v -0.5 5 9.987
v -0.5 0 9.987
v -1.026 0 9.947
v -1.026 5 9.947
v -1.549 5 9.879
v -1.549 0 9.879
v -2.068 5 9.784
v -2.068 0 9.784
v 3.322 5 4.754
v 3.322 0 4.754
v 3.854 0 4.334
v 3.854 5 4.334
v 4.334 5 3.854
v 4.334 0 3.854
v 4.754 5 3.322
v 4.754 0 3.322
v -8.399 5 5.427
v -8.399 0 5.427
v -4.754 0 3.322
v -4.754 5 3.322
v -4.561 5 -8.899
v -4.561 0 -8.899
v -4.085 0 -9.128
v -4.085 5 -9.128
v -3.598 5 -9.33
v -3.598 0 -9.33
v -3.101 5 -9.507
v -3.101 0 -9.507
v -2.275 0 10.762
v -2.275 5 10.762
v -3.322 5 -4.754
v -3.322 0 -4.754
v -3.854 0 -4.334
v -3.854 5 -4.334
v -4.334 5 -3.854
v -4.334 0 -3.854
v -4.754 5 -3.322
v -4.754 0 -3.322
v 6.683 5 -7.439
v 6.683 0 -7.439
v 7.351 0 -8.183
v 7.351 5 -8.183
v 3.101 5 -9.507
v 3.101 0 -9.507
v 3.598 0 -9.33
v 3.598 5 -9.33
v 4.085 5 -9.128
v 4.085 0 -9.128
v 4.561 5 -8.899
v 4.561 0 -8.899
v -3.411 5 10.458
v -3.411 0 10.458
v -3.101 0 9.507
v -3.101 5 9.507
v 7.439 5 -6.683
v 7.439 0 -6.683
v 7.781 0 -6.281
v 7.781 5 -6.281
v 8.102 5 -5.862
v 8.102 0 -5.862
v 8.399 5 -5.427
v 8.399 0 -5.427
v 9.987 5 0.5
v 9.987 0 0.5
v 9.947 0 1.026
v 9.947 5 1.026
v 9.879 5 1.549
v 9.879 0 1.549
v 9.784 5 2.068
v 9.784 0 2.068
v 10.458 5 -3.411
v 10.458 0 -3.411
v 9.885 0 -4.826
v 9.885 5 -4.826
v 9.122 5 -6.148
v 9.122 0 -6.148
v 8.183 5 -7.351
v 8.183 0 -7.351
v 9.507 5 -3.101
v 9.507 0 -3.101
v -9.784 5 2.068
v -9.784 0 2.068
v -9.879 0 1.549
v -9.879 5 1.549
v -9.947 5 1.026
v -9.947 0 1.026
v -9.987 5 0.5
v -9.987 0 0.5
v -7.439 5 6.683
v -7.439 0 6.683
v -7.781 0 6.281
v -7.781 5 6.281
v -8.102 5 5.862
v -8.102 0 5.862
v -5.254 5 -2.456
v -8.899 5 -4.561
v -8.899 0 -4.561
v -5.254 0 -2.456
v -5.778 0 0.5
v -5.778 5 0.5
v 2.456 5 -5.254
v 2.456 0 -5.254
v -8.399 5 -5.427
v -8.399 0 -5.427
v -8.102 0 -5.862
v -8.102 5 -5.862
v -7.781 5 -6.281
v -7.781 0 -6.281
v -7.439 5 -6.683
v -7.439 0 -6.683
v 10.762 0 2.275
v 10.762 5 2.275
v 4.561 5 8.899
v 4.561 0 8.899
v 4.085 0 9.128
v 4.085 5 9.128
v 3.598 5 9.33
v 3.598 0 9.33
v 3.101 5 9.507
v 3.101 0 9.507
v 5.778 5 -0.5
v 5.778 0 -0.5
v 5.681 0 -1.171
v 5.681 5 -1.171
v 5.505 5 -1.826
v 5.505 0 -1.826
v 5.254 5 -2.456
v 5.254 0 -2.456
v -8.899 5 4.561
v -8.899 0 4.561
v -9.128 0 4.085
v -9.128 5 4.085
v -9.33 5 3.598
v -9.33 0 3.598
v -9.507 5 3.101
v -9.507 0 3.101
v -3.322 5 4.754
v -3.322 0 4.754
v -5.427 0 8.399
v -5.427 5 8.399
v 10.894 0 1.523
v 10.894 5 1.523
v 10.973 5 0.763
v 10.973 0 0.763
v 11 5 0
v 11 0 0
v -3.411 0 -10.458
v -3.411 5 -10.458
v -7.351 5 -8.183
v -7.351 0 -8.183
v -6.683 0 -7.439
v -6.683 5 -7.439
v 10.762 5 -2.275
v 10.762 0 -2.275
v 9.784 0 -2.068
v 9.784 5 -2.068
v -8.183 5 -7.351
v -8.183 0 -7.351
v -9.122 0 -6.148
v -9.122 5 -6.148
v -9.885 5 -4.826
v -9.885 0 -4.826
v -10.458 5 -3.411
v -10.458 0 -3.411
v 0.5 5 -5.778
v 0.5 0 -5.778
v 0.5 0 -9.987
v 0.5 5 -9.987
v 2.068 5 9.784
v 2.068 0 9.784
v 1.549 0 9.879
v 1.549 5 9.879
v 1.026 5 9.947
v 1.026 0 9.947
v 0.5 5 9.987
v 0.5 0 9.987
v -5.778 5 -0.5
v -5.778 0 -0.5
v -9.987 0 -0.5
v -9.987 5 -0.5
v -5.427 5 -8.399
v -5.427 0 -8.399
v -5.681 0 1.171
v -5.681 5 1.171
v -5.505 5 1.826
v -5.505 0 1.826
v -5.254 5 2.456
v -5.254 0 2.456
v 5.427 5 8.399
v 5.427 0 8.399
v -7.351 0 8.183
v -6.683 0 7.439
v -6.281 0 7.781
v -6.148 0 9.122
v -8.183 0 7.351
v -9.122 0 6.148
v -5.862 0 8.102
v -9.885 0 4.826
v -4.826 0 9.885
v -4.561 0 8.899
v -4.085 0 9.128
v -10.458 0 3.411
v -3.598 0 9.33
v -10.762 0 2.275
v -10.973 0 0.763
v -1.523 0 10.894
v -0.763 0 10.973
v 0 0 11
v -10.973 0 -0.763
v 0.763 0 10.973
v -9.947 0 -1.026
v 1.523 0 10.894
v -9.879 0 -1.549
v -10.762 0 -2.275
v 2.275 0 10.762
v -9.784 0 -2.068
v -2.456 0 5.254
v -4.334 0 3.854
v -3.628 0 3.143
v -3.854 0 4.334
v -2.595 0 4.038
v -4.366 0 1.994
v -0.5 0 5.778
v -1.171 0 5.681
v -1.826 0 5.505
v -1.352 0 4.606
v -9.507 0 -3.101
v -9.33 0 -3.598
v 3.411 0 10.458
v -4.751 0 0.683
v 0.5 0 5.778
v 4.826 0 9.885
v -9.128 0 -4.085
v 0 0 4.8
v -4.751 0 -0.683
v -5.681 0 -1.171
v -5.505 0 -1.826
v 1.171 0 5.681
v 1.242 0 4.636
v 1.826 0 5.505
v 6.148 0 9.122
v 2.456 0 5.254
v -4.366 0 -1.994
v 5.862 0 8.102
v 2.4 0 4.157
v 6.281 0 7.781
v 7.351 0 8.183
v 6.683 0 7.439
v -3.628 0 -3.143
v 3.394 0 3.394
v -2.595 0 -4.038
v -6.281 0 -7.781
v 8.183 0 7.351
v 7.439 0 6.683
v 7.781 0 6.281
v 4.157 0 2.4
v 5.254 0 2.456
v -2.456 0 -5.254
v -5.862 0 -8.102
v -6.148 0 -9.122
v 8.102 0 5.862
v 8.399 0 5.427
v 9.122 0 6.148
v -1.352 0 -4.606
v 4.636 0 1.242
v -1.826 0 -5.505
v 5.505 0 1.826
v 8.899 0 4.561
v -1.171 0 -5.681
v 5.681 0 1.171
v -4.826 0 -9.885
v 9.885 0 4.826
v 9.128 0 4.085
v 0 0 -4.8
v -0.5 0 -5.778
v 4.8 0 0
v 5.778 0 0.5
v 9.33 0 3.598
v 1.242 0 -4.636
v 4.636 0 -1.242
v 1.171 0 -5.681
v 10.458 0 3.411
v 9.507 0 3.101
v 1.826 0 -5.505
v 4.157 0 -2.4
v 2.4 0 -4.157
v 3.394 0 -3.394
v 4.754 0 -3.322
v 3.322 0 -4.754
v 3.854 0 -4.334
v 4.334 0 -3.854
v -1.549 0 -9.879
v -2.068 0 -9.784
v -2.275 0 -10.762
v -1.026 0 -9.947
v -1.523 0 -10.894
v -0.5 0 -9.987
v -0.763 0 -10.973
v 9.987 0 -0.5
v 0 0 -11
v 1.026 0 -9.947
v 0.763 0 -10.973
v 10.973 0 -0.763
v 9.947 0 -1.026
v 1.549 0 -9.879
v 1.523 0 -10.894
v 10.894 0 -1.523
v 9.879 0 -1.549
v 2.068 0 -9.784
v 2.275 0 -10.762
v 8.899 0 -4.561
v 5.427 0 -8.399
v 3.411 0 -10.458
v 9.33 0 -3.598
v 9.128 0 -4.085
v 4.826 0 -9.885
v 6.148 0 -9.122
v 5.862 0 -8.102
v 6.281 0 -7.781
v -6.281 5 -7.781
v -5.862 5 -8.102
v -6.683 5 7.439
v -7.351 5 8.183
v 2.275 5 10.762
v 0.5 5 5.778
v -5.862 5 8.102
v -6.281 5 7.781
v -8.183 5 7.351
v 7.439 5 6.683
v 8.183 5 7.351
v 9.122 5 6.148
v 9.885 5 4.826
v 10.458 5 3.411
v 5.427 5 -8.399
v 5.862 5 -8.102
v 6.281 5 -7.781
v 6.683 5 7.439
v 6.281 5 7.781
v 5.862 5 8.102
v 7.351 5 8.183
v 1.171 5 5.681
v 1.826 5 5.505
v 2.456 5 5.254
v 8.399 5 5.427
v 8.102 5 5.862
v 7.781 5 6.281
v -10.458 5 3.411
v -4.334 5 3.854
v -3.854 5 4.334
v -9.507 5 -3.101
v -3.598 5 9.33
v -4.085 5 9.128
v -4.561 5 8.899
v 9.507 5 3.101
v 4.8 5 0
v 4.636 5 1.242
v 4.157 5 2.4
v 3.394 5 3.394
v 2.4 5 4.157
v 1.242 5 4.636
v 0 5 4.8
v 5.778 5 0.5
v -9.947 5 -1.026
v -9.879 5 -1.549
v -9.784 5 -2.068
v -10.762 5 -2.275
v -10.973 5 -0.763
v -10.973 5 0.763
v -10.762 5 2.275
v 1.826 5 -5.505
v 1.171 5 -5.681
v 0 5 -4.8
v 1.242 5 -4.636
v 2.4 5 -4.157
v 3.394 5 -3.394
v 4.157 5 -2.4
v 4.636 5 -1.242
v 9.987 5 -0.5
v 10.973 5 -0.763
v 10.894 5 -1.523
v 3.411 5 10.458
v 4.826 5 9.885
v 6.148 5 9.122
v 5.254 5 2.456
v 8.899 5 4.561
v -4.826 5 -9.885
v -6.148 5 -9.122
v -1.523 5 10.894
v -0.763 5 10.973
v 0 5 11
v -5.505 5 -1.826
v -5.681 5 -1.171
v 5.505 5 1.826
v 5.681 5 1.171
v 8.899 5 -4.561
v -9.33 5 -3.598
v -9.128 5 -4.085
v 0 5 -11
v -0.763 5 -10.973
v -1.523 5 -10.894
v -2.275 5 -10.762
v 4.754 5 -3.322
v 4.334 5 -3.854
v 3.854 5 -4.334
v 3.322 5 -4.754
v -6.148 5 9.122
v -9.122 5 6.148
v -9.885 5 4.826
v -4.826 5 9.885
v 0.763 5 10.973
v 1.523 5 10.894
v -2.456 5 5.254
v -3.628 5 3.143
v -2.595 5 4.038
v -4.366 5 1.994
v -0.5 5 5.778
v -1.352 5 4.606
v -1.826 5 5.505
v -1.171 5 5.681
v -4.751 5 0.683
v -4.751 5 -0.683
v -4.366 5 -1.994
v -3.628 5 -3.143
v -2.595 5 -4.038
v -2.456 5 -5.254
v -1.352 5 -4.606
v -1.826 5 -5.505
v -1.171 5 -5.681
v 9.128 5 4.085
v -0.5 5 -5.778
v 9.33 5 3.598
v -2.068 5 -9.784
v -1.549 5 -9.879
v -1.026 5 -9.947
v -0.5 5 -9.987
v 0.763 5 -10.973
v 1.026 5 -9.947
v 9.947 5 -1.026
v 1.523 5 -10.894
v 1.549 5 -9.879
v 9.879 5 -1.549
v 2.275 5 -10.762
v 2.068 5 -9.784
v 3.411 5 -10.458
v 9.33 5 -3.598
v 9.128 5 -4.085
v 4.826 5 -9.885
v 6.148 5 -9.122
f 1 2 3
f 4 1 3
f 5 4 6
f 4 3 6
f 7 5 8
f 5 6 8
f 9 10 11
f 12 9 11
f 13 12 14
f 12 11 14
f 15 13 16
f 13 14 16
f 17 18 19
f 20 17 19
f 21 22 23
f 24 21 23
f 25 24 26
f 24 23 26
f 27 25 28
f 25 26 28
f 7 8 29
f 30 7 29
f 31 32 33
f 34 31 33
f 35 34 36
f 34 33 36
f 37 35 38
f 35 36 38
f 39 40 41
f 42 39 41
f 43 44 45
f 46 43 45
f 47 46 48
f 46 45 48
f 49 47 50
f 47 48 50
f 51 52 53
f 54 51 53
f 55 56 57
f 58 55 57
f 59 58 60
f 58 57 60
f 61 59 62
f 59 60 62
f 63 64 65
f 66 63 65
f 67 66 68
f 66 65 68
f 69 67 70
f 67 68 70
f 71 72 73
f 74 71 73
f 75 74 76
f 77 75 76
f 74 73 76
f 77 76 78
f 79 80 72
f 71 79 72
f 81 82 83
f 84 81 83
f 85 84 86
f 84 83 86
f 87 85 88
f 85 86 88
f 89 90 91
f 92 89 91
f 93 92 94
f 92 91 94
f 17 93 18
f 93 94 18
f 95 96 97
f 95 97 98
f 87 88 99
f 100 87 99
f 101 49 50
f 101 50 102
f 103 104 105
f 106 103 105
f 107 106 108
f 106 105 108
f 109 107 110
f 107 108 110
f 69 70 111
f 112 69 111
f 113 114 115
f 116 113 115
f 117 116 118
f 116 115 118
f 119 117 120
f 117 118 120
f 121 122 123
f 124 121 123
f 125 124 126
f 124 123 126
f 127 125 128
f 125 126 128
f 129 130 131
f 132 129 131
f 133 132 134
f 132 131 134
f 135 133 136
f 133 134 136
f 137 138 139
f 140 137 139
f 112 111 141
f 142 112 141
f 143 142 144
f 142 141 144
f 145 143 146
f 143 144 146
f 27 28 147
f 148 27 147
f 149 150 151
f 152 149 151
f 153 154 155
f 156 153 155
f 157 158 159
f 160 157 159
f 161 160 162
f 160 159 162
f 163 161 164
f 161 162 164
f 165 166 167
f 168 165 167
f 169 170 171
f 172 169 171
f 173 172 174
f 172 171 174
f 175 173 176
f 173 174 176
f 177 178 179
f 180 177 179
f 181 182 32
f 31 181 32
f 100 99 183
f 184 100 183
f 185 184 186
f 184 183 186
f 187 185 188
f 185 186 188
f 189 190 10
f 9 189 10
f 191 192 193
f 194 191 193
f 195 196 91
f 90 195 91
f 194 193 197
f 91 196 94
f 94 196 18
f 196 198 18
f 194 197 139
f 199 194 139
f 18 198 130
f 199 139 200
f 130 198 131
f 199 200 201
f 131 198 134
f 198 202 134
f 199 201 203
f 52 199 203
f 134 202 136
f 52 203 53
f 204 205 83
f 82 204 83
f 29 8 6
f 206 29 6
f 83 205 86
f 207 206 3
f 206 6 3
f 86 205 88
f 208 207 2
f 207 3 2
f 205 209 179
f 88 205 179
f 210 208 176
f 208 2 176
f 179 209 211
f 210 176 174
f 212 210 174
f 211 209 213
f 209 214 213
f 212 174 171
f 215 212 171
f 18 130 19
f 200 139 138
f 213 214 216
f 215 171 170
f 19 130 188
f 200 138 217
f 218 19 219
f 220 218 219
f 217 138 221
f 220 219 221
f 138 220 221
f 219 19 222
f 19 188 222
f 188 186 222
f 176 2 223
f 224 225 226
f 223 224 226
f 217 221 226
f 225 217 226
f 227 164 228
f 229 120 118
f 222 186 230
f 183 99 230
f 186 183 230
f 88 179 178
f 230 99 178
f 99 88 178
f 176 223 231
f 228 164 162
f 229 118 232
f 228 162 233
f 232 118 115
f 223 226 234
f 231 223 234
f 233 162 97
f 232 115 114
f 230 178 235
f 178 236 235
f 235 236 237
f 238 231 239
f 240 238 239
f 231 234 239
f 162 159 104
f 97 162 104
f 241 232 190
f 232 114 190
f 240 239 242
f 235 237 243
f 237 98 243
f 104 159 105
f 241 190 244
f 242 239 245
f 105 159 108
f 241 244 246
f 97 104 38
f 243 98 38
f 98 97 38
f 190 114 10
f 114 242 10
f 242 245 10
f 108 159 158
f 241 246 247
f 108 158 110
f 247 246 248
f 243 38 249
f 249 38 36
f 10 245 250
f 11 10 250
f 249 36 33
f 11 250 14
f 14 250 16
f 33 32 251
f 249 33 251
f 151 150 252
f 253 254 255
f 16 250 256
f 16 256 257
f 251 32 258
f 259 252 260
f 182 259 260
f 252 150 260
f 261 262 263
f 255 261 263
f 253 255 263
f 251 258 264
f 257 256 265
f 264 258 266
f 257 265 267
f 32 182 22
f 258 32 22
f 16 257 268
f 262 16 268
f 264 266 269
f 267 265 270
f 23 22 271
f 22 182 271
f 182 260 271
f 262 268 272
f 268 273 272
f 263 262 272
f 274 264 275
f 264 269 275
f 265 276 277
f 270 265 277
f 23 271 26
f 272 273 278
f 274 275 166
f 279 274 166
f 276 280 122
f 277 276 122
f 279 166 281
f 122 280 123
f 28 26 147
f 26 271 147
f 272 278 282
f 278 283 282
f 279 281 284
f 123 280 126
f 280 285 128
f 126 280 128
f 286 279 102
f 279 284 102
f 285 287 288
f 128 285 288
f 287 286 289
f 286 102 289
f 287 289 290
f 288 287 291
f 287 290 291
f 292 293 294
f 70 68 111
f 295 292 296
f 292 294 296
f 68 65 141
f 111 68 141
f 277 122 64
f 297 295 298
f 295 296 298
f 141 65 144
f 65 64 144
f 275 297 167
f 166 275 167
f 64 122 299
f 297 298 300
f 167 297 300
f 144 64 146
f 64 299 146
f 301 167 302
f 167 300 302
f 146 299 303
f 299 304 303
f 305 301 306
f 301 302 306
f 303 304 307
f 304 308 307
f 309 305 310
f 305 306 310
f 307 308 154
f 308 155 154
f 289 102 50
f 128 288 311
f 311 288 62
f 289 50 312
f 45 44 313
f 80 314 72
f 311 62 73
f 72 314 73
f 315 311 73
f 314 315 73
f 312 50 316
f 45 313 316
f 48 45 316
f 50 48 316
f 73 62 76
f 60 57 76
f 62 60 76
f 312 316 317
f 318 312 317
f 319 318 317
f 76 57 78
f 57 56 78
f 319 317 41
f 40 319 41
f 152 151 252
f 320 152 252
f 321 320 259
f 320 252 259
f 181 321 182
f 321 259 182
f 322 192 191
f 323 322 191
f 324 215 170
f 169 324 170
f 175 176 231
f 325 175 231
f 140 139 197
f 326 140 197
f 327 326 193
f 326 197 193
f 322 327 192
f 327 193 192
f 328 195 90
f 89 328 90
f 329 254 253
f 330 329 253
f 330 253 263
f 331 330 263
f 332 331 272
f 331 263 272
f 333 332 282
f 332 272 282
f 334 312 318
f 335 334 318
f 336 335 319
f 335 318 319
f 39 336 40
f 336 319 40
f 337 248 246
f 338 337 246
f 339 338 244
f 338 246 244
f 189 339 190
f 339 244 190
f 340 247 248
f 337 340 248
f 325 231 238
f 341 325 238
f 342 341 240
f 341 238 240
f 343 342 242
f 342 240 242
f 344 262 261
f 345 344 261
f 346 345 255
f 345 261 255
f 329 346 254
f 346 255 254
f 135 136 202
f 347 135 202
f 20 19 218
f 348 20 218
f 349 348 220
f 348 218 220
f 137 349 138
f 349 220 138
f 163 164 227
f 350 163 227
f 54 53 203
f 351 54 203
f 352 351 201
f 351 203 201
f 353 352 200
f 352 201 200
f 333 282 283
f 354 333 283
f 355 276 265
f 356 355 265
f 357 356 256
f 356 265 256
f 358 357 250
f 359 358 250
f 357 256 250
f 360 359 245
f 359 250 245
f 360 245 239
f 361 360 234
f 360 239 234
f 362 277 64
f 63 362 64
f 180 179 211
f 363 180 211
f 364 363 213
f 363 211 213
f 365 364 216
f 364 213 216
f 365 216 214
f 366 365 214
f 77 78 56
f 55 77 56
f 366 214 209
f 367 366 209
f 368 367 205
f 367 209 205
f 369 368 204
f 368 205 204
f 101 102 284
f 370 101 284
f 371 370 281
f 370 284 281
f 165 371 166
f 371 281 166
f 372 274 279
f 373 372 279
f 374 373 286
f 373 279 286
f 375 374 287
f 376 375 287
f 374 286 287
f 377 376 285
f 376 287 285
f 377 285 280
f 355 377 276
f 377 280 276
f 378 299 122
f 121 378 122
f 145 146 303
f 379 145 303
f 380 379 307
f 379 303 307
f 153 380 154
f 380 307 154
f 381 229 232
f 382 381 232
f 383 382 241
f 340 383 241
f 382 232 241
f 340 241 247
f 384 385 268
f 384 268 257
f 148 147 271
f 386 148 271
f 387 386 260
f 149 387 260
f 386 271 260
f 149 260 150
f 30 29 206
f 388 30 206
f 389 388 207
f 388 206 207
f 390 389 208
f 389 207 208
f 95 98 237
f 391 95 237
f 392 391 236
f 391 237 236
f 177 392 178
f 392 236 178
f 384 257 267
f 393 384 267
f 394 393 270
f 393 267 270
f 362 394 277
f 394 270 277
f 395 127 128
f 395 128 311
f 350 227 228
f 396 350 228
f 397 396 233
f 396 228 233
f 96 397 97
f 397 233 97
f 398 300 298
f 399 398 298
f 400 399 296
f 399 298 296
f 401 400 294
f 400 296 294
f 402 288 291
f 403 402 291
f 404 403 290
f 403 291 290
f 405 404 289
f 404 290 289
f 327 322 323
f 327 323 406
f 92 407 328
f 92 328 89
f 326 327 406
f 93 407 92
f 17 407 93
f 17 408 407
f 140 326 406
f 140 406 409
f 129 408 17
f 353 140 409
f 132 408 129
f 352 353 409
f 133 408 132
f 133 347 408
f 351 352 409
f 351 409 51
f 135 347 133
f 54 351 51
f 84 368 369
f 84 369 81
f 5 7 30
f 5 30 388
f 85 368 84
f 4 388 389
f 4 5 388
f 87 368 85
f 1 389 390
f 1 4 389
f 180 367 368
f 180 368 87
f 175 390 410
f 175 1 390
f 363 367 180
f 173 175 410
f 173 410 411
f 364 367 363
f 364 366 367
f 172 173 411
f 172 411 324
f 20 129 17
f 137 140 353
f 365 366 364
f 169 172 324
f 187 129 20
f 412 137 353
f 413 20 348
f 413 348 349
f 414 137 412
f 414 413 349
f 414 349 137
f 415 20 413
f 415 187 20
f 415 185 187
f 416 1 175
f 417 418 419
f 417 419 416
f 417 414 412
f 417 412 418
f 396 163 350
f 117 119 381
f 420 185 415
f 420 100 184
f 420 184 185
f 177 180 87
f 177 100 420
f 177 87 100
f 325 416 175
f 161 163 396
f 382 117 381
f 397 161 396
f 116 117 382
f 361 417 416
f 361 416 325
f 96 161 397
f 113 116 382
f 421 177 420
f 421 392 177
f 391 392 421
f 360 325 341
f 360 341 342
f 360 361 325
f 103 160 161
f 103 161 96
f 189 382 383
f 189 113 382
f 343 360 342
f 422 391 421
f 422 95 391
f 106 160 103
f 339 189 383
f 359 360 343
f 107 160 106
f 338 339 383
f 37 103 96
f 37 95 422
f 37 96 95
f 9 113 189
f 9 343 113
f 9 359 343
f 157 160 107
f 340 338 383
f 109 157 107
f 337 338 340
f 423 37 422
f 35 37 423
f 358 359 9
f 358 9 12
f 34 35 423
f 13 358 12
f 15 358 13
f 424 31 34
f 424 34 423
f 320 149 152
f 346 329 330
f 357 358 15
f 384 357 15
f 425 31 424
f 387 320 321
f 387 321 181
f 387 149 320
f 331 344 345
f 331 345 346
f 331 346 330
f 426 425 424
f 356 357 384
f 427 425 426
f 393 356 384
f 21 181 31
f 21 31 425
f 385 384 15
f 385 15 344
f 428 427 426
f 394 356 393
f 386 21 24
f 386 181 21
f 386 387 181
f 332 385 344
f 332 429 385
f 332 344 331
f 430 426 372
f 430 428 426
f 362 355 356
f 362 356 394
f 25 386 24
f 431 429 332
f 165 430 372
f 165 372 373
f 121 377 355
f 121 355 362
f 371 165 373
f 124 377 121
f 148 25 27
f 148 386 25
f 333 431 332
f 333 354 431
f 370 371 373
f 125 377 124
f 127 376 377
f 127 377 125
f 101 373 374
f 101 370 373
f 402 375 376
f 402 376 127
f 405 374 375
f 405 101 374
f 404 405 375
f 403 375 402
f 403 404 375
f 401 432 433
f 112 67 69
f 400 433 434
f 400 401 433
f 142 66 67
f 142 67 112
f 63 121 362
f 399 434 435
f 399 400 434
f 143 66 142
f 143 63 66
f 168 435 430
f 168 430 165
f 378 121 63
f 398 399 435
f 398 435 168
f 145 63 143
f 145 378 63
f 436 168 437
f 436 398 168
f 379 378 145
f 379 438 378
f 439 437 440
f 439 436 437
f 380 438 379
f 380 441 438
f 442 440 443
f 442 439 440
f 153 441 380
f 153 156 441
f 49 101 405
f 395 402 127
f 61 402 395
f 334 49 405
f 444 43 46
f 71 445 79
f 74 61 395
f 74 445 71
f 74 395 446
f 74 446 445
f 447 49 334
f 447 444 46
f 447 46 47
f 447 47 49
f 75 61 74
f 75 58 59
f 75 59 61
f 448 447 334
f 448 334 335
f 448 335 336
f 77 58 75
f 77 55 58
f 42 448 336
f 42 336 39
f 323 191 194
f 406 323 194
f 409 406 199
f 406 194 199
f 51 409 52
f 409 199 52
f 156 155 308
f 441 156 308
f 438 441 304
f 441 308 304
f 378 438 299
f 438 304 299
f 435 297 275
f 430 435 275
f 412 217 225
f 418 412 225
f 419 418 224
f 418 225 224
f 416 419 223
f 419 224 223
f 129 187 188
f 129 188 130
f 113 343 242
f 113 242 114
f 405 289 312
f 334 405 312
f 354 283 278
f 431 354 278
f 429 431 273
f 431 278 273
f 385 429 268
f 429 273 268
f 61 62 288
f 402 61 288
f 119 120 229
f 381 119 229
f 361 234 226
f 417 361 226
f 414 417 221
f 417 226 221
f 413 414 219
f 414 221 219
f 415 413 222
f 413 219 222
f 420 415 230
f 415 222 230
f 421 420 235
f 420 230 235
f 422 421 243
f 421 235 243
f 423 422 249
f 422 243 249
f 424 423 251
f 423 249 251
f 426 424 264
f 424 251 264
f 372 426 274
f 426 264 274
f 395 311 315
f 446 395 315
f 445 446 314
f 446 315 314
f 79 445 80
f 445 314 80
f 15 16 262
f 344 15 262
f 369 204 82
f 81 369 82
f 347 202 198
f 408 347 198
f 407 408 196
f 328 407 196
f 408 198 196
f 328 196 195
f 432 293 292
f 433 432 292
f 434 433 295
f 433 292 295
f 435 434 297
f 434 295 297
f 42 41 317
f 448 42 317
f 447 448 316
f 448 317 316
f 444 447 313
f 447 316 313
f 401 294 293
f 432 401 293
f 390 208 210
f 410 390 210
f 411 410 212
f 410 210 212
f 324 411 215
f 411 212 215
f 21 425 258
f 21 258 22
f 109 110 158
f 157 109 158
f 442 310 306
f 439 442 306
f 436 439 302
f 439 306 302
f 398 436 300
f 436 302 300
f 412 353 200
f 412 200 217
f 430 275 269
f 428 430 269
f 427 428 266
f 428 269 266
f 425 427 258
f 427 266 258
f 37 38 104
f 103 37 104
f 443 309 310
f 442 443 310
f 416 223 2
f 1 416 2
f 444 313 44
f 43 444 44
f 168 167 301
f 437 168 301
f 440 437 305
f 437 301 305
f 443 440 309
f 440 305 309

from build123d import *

# Parameters (mm, degrees)
BOSS_EXTRUDE1_DEPTH = 5


with BuildPart() as part:
    # Sketch1 → Boss-Extrude1 (new body)
    with BuildSketch(Plane(origin=(0, 0, 0), x_dir=(1, 0, 0), z_dir=(0, 1, 0))):
        with BuildLine():
            ThreePointArc((0.5, 5.778408085), (0.250232997, 5.794599507), (0, 5.8))
            Line((0, 5.8), (0, 4.8))
            ThreePointArc((0, 4.8), (3.39411255, 3.39411255), (4.8, 0))
            ThreePointArc((4.8, 0), (3.39411255, -3.39411255), (0, -4.8))
            Line((0, -4.8), (0, -5.8))
            ThreePointArc((0, -5.8), (0.250232997, -5.794599507), (0.5, -5.778408085))
            ThreePointArc((0.5, -5.778408085), (1.501150462, -5.602369792), (2.456191341, -5.254248195))
            ThreePointArc((2.456191341, -5.254248195), (2.9, -5.022947342), (3.322216745, -4.754248195))
            ThreePointArc((3.322216745, -4.754248195), (4.101219331, -4.101219331), (4.754248195, -3.322216745))
            ThreePointArc((4.754248195, -3.322216745), (5.022947342, -2.9), (5.254248195, -2.456191341))
            ThreePointArc((5.254248195, -2.456191341), (5.602369792, -1.501150462), (5.778408085, -0.5))
            ThreePointArc((5.778408085, -0.5), (5.794599507, -0.250232997), (5.8, 0))
            ThreePointArc((5.8, 0), (5.794599507, 0.250232997), (5.778408085, 0.5))
            ThreePointArc((5.778408085, 0.5), (5.602369792, 1.501150462), (5.254248195, 2.456191341))
            ThreePointArc((5.254248195, 2.456191341), (5.022947342, 2.9), (4.754248195, 3.322216745))
            ThreePointArc((4.754248195, 3.322216745), (4.101219331, 4.101219331), (3.322216745, 4.754248195))
            ThreePointArc((3.322216745, 4.754248195), (2.9, 5.022947342), (2.456191341, 5.254248195))
            ThreePointArc((2.456191341, 5.254248195), (1.501150462, 5.602369792), (0.5, 5.778408085))
        make_face()
        with BuildLine():
            Line((0, 4.8), (0, 5.8))
            ThreePointArc((0, 5.8), (-0.250232997, 5.794599507), (-0.5, 5.778408085))
            ThreePointArc((-0.5, 5.778408085), (-1.501150462, 5.602369792), (-2.456191341, 5.254248195))
            ThreePointArc((-2.456191341, 5.254248195), (-2.9, 5.022947342), (-3.322216745, 4.754248195))
            ThreePointArc((-3.322216745, 4.754248195), (-4.101219331, 4.101219331), (-4.754248195, 3.322216745))
            ThreePointArc((-4.754248195, 3.322216745), (-5.022947342, 2.9), (-5.254248195, 2.456191341))
            ThreePointArc((-5.254248195, 2.456191341), (-5.602369792, 1.501150462), (-5.778408085, 0.5))
            ThreePointArc((-5.778408085, 0.5), (-5.8, 0), (-5.778408085, -0.5))
            ThreePointArc((-5.778408085, -0.5), (-5.602369792, -1.501150462), (-5.254248195, -2.456191341))
            ThreePointArc((-5.254248195, -2.456191341), (-5.022947342, -2.9), (-4.754248195, -3.322216745))
            ThreePointArc((-4.754248195, -3.322216745), (-4.101219331, -4.101219331), (-3.322216745, -4.754248195))
            ThreePointArc((-3.322216745, -4.754248195), (-2.9, -5.022947342), (-2.456191341, -5.254248195))
            ThreePointArc((-2.456191341, -5.254248195), (-1.501150462, -5.602369792), (-0.5, -5.778408085))
            ThreePointArc((-0.5, -5.778408085), (-0.250232997, -5.794599507), (0, -5.8))
            Line((0, -5.8), (0, -4.8))
            ThreePointArc((0, -4.8), (-4.8, 0), (0, 4.8))
        make_face()
        with BuildLine():
            Line((0, 5.8), (0, 10))
            ThreePointArc((0, 10), (-0.250078211, 9.996872555), (-0.5, 9.987492178))
            Line((-0.5, 9.987492178), (-0.5, 5.778408085))
            ThreePointArc((-0.5, 5.778408085), (-0.250232997, 5.794599507), (0, 5.8))
        make_face()
        with BuildLine():
            ThreePointArc((0.5, 9.987492178), (0.250078211, 9.996872555), (0, 10))
            Line((0, 10), (0, 5.8))
            ThreePointArc((0, 5.8), (0.250232997, 5.794599507), (0.5, 5.778408085))
            Line((0.5, 5.778408085), (0.5, 9.987492178))
        make_face()
        with BuildLine():
            ThreePointArc((2.275, 10.76217334), (1.143698662, 10.940381774), (0, 11))
            Line((0, 11), (0, 10))
            ThreePointArc((0, 10), (0.250078211, 9.996872555), (0.5, 9.987492178))
            ThreePointArc((0.5, 9.987492178), (1.288123715, 9.916689836), (2.068181818, 9.783793945))
            Line((2.068181818, 9.783793945), (2.275, 10.76217334))
        make_face()
        with BuildLine():
            Line((0, 10), (0, 11))
            ThreePointArc((0, 11), (-1.143698662, 10.940381774), (-2.275, 10.76217334))
            Line((-2.275, 10.76217334), (-2.068181818, 9.783793945))
            ThreePointArc((-2.068181818, 9.783793945), (-1.288123715, 9.916689836), (-0.5, 9.987492178))
            ThreePointArc((-0.5, 9.987492178), (-0.250078211, 9.996872555), (0, 10))
        make_face()
        with BuildLine():
            Line((4.560733387, 8.899421946), (2.456191341, 5.254248195))
            ThreePointArc((2.456191341, 5.254248195), (2.9, 5.022947342), (3.322216745, 4.754248195))
            Line((3.322216745, 4.754248195), (5.426758791, 8.399421946))
            ThreePointArc((5.426758791, 8.399421946), (5, 8.660254038), (4.560733387, 8.899421946))
        make_face()
        with BuildLine():
            ThreePointArc((7.351294464, 8.182815512), (5.5, 9.526279442), (3.410878876, 10.457815512))
            Line((3.410878876, 10.457815512), (3.100798979, 9.507105011))
            ThreePointArc((3.100798979, 9.507105011), (3.842797057, 9.232167177), (4.560733387, 8.899421946))
            ThreePointArc((4.560733387, 8.899421946), (5, 8.660254038), (5.426758791, 8.399421946))
            ThreePointArc((5.426758791, 8.399421946), (6.073892778, 7.944043462), (6.682994967, 7.438923193))
            Line((6.682994967, 7.438923193), (7.351294464, 8.182815512))
        make_face()
        with BuildLine():
            Line((8.399421946, 5.426758791), (4.754248195, 3.322216745))
            ThreePointArc((4.754248195, 3.322216745), (5.022947342, 2.9), (5.254248195, 2.456191341))
            Line((5.254248195, 2.456191341), (8.899421946, 4.560733387))
            ThreePointArc((8.899421946, 4.560733387), (8.660254038, 5), (8.399421946, 5.426758791))
        make_face()
        with BuildLine():
            ThreePointArc((10.457815512, 3.410878876), (9.526279442, 5.5), (8.182815512, 7.351294464))
            Line((8.182815512, 7.351294464), (7.438923193, 6.682994967))
            ThreePointArc((7.438923193, 6.682994967), (7.944043462, 6.073892778), (8.399421946, 5.426758791))
            ThreePointArc((8.399421946, 5.426758791), (8.660254038, 5), (8.899421946, 4.560733387))
            ThreePointArc((8.899421946, 4.560733387), (9.232167177, 3.842797057), (9.507105011, 3.100798979))
            Line((9.507105011, 3.100798979), (10.457815512, 3.410878876))
        make_face()
        with BuildLine():
            Line((9.987492178, 0.5), (5.778408085, 0.5))
            ThreePointArc((5.778408085, 0.5), (5.794599507, 0.250232997), (5.8, 0))
            ThreePointArc((5.8, 0), (5.794599507, -0.250232997), (5.778408085, -0.5))
            Line((5.778408085, -0.5), (9.987492178, -0.5))
            ThreePointArc((9.987492178, -0.5), (9.996872555, -0.250078211), (10, 0))
            ThreePointArc((10, 0), (9.996872555, 0.250078211), (9.987492178, 0.5))
        make_face()
        with BuildLine():
            ThreePointArc((11, 0), (10.940381774, 1.143698662), (10.76217334, 2.275))
            Line((10.76217334, 2.275), (9.783793945, 2.068181818))
            ThreePointArc((9.783793945, 2.068181818), (9.916689836, 1.288123715), (9.987492178, 0.5))
            ThreePointArc((9.987492178, 0.5), (9.996872555, 0.250078211), (10, 0))
            ThreePointArc((10, 0), (9.996872555, -0.250078211), (9.987492178, -0.5))
            ThreePointArc((9.987492178, -0.5), (9.916689836, -1.288123715), (9.783793945, -2.068181818))
            Line((9.783793945, -2.068181818), (10.76217334, -2.275))
            ThreePointArc((10.76217334, -2.275), (10.940381774, -1.143698662), (11, 0))
        make_face()
        with BuildLine():
            ThreePointArc((5.254248195, -2.456191341), (5.022947342, -2.9), (4.754248195, -3.322216745))
            Line((4.754248195, -3.322216745), (8.399421946, -5.426758791))
            ThreePointArc((8.399421946, -5.426758791), (8.660254038, -5), (8.899421946, -4.560733387))
            Line((8.899421946, -4.560733387), (5.254248195, -2.456191341))
        make_face()
        with BuildLine():
            ThreePointArc((8.182815512, -7.351294464), (9.526279442, -5.5), (10.457815512, -3.410878876))
            Line((10.457815512, -3.410878876), (9.507105011, -3.100798979))
            ThreePointArc((9.507105011, -3.100798979), (9.232167177, -3.842797057), (8.899421946, -4.560733387))
            ThreePointArc((8.899421946, -4.560733387), (8.660254038, -5), (8.399421946, -5.426758791))
            ThreePointArc((8.399421946, -5.426758791), (7.944043462, -6.073892778), (7.438923193, -6.682994967))
            Line((7.438923193, -6.682994967), (8.182815512, -7.351294464))
        make_face()
        with BuildLine():
            ThreePointArc((3.322216745, -4.754248195), (2.9, -5.022947342), (2.456191341, -5.254248195))
            Line((2.456191341, -5.254248195), (4.560733387, -8.899421946))
            ThreePointArc((4.560733387, -8.899421946), (5, -8.660254038), (5.426758791, -8.399421946))
            Line((5.426758791, -8.399421946), (3.322216745, -4.754248195))
        make_face()
        with BuildLine():
            ThreePointArc((5.426758791, -8.399421946), (5, -8.660254038), (4.560733387, -8.899421946))
            ThreePointArc((4.560733387, -8.899421946), (3.842797057, -9.232167177), (3.100798979, -9.507105011))
            Line((3.100798979, -9.507105011), (3.410878876, -10.457815512))
            ThreePointArc((3.410878876, -10.457815512), (5.5, -9.526279442), (7.351294464, -8.182815512))
            Line((7.351294464, -8.182815512), (6.682994967, -7.438923193))
            ThreePointArc((6.682994967, -7.438923193), (6.073892778, -7.944043462), (5.426758791, -8.399421946))
        make_face()
        with BuildLine():
            Line((0, -10), (0, -5.8))
            ThreePointArc((0, -5.8), (-0.250232997, -5.794599507), (-0.5, -5.778408085))
            Line((-0.5, -5.778408085), (-0.5, -9.987492178))
            ThreePointArc((-0.5, -9.987492178), (-0.250078211, -9.996872555), (0, -10))
        make_face()
        with BuildLine():
            ThreePointArc((0.5, -5.778408085), (0.250232997, -5.794599507), (0, -5.8))
            Line((0, -5.8), (0, -10))
            ThreePointArc((0, -10), (0.250078211, -9.996872555), (0.5, -9.987492178))
            Line((0.5, -9.987492178), (0.5, -5.778408085))
        make_face()
        with BuildLine():
            ThreePointArc((0.5, -9.987492178), (0.250078211, -9.996872555), (0, -10))
            Line((0, -10), (0, -11))
            ThreePointArc((0, -11), (1.143698662, -10.940381774), (2.275, -10.76217334))
            Line((2.275, -10.76217334), (2.068181818, -9.783793945))
            ThreePointArc((2.068181818, -9.783793945), (1.288123715, -9.916689836), (0.5, -9.987492178))
        make_face()
        with BuildLine():
            Line((0, -11), (0, -10))
            ThreePointArc((0, -10), (-0.250078211, -9.996872555), (-0.5, -9.987492178))
            ThreePointArc((-0.5, -9.987492178), (-1.288123715, -9.916689836), (-2.068181818, -9.783793945))
            Line((-2.068181818, -9.783793945), (-2.275, -10.76217334))
            ThreePointArc((-2.275, -10.76217334), (-1.143698662, -10.940381774), (0, -11))
        make_face()
        with BuildLine():
            Line((-4.560733387, -8.899421946), (-2.456191341, -5.254248195))
            ThreePointArc((-2.456191341, -5.254248195), (-2.9, -5.022947342), (-3.322216745, -4.754248195))
            Line((-3.322216745, -4.754248195), (-5.426758791, -8.399421946))
            ThreePointArc((-5.426758791, -8.399421946), (-5, -8.660254038), (-4.560733387, -8.899421946))
        make_face()
        with BuildLine():
            ThreePointArc((-3.100798979, -9.507105011), (-3.842797057, -9.232167177), (-4.560733387, -8.899421946))
            ThreePointArc((-4.560733387, -8.899421946), (-5, -8.660254038), (-5.426758791, -8.399421946))
            ThreePointArc((-5.426758791, -8.399421946), (-6.073892778, -7.944043462), (-6.682994967, -7.438923193))
            Line((-6.682994967, -7.438923193), (-7.351294464, -8.182815512))
            ThreePointArc((-7.351294464, -8.182815512), (-5.5, -9.526279442), (-3.410878876, -10.457815512))
            Line((-3.410878876, -10.457815512), (-3.100798979, -9.507105011))
        make_face()
        with BuildLine():
            Line((-8.399421946, -5.426758791), (-4.754248195, -3.322216745))
            ThreePointArc((-4.754248195, -3.322216745), (-5.022947342, -2.9), (-5.254248195, -2.456191341))
            Line((-5.254248195, -2.456191341), (-8.899421946, -4.560733387))
            ThreePointArc((-8.899421946, -4.560733387), (-8.660254038, -5), (-8.399421946, -5.426758791))
        make_face()
        with BuildLine():
            Line((-9.507105011, -3.100798979), (-10.457815512, -3.410878876))
            ThreePointArc((-10.457815512, -3.410878876), (-9.526279442, -5.5), (-8.182815512, -7.351294464))
            Line((-8.182815512, -7.351294464), (-7.438923193, -6.682994967))
            ThreePointArc((-7.438923193, -6.682994967), (-7.944043462, -6.073892778), (-8.399421946, -5.426758791))
            ThreePointArc((-8.399421946, -5.426758791), (-8.660254038, -5), (-8.899421946, -4.560733387))
            ThreePointArc((-8.899421946, -4.560733387), (-9.232167177, -3.842797057), (-9.507105011, -3.100798979))
        make_face()
        with BuildLine():
            ThreePointArc((-5.778408085, -0.5), (-5.8, 0), (-5.778408085, 0.5))
            Line((-5.778408085, 0.5), (-9.987492178, 0.5))
            ThreePointArc((-9.987492178, 0.5), (-10, 0), (-9.987492178, -0.5))
            Line((-9.987492178, -0.5), (-5.778408085, -0.5))
        make_face()
        with BuildLine():
            Line((-9.783793945, 2.068181818), (-10.76217334, 2.275))
            ThreePointArc((-10.76217334, 2.275), (-11, 0), (-10.76217334, -2.275))
            Line((-10.76217334, -2.275), (-9.783793945, -2.068181818))
            ThreePointArc((-9.783793945, -2.068181818), (-9.916689836, -1.288123715), (-9.987492178, -0.5))
            ThreePointArc((-9.987492178, -0.5), (-10, 0), (-9.987492178, 0.5))
            ThreePointArc((-9.987492178, 0.5), (-9.916689836, 1.288123715), (-9.783793945, 2.068181818))
        make_face()
        with BuildLine():
            ThreePointArc((-5.254248195, 2.456191341), (-5.022947342, 2.9), (-4.754248195, 3.322216745))
            Line((-4.754248195, 3.322216745), (-8.399421946, 5.426758791))
            ThreePointArc((-8.399421946, 5.426758791), (-8.660254038, 5), (-8.899421946, 4.560733387))
            Line((-8.899421946, 4.560733387), (-5.254248195, 2.456191341))
        make_face()
        with BuildLine():
            Line((-7.438923193, 6.682994967), (-8.182815512, 7.351294464))
            ThreePointArc((-8.182815512, 7.351294464), (-9.526279442, 5.5), (-10.457815512, 3.410878876))
            Line((-10.457815512, 3.410878876), (-9.507105011, 3.100798979))
            ThreePointArc((-9.507105011, 3.100798979), (-9.232167177, 3.842797057), (-8.899421946, 4.560733387))
            ThreePointArc((-8.899421946, 4.560733387), (-8.660254038, 5), (-8.399421946, 5.426758791))
            ThreePointArc((-8.399421946, 5.426758791), (-7.944043462, 6.073892778), (-7.438923193, 6.682994967))
        make_face()
        with BuildLine():
            ThreePointArc((-3.322216745, 4.754248195), (-2.9, 5.022947342), (-2.456191341, 5.254248195))
            Line((-2.456191341, 5.254248195), (-4.560733387, 8.899421946))
            ThreePointArc((-4.560733387, 8.899421946), (-5, 8.660254038), (-5.426758791, 8.399421946))
            Line((-5.426758791, 8.399421946), (-3.322216745, 4.754248195))
        make_face()
        with BuildLine():
            Line((-3.100798979, 9.507105011), (-3.410878876, 10.457815512))
            ThreePointArc((-3.410878876, 10.457815512), (-5.5, 9.526279442), (-7.351294464, 8.182815512))
            Line((-7.351294464, 8.182815512), (-6.682994967, 7.438923193))
            ThreePointArc((-6.682994967, 7.438923193), (-6.073892778, 7.944043462), (-5.426758791, 8.399421946))
            ThreePointArc((-5.426758791, 8.399421946), (-5, 8.660254038), (-4.560733387, 8.899421946))
            ThreePointArc((-4.560733387, 8.899421946), (-3.842797057, 9.232167177), (-3.100798979, 9.507105011))
        make_face()
    extrude(amount=BOSS_EXTRUDE1_DEPTH)


solid = part.part
